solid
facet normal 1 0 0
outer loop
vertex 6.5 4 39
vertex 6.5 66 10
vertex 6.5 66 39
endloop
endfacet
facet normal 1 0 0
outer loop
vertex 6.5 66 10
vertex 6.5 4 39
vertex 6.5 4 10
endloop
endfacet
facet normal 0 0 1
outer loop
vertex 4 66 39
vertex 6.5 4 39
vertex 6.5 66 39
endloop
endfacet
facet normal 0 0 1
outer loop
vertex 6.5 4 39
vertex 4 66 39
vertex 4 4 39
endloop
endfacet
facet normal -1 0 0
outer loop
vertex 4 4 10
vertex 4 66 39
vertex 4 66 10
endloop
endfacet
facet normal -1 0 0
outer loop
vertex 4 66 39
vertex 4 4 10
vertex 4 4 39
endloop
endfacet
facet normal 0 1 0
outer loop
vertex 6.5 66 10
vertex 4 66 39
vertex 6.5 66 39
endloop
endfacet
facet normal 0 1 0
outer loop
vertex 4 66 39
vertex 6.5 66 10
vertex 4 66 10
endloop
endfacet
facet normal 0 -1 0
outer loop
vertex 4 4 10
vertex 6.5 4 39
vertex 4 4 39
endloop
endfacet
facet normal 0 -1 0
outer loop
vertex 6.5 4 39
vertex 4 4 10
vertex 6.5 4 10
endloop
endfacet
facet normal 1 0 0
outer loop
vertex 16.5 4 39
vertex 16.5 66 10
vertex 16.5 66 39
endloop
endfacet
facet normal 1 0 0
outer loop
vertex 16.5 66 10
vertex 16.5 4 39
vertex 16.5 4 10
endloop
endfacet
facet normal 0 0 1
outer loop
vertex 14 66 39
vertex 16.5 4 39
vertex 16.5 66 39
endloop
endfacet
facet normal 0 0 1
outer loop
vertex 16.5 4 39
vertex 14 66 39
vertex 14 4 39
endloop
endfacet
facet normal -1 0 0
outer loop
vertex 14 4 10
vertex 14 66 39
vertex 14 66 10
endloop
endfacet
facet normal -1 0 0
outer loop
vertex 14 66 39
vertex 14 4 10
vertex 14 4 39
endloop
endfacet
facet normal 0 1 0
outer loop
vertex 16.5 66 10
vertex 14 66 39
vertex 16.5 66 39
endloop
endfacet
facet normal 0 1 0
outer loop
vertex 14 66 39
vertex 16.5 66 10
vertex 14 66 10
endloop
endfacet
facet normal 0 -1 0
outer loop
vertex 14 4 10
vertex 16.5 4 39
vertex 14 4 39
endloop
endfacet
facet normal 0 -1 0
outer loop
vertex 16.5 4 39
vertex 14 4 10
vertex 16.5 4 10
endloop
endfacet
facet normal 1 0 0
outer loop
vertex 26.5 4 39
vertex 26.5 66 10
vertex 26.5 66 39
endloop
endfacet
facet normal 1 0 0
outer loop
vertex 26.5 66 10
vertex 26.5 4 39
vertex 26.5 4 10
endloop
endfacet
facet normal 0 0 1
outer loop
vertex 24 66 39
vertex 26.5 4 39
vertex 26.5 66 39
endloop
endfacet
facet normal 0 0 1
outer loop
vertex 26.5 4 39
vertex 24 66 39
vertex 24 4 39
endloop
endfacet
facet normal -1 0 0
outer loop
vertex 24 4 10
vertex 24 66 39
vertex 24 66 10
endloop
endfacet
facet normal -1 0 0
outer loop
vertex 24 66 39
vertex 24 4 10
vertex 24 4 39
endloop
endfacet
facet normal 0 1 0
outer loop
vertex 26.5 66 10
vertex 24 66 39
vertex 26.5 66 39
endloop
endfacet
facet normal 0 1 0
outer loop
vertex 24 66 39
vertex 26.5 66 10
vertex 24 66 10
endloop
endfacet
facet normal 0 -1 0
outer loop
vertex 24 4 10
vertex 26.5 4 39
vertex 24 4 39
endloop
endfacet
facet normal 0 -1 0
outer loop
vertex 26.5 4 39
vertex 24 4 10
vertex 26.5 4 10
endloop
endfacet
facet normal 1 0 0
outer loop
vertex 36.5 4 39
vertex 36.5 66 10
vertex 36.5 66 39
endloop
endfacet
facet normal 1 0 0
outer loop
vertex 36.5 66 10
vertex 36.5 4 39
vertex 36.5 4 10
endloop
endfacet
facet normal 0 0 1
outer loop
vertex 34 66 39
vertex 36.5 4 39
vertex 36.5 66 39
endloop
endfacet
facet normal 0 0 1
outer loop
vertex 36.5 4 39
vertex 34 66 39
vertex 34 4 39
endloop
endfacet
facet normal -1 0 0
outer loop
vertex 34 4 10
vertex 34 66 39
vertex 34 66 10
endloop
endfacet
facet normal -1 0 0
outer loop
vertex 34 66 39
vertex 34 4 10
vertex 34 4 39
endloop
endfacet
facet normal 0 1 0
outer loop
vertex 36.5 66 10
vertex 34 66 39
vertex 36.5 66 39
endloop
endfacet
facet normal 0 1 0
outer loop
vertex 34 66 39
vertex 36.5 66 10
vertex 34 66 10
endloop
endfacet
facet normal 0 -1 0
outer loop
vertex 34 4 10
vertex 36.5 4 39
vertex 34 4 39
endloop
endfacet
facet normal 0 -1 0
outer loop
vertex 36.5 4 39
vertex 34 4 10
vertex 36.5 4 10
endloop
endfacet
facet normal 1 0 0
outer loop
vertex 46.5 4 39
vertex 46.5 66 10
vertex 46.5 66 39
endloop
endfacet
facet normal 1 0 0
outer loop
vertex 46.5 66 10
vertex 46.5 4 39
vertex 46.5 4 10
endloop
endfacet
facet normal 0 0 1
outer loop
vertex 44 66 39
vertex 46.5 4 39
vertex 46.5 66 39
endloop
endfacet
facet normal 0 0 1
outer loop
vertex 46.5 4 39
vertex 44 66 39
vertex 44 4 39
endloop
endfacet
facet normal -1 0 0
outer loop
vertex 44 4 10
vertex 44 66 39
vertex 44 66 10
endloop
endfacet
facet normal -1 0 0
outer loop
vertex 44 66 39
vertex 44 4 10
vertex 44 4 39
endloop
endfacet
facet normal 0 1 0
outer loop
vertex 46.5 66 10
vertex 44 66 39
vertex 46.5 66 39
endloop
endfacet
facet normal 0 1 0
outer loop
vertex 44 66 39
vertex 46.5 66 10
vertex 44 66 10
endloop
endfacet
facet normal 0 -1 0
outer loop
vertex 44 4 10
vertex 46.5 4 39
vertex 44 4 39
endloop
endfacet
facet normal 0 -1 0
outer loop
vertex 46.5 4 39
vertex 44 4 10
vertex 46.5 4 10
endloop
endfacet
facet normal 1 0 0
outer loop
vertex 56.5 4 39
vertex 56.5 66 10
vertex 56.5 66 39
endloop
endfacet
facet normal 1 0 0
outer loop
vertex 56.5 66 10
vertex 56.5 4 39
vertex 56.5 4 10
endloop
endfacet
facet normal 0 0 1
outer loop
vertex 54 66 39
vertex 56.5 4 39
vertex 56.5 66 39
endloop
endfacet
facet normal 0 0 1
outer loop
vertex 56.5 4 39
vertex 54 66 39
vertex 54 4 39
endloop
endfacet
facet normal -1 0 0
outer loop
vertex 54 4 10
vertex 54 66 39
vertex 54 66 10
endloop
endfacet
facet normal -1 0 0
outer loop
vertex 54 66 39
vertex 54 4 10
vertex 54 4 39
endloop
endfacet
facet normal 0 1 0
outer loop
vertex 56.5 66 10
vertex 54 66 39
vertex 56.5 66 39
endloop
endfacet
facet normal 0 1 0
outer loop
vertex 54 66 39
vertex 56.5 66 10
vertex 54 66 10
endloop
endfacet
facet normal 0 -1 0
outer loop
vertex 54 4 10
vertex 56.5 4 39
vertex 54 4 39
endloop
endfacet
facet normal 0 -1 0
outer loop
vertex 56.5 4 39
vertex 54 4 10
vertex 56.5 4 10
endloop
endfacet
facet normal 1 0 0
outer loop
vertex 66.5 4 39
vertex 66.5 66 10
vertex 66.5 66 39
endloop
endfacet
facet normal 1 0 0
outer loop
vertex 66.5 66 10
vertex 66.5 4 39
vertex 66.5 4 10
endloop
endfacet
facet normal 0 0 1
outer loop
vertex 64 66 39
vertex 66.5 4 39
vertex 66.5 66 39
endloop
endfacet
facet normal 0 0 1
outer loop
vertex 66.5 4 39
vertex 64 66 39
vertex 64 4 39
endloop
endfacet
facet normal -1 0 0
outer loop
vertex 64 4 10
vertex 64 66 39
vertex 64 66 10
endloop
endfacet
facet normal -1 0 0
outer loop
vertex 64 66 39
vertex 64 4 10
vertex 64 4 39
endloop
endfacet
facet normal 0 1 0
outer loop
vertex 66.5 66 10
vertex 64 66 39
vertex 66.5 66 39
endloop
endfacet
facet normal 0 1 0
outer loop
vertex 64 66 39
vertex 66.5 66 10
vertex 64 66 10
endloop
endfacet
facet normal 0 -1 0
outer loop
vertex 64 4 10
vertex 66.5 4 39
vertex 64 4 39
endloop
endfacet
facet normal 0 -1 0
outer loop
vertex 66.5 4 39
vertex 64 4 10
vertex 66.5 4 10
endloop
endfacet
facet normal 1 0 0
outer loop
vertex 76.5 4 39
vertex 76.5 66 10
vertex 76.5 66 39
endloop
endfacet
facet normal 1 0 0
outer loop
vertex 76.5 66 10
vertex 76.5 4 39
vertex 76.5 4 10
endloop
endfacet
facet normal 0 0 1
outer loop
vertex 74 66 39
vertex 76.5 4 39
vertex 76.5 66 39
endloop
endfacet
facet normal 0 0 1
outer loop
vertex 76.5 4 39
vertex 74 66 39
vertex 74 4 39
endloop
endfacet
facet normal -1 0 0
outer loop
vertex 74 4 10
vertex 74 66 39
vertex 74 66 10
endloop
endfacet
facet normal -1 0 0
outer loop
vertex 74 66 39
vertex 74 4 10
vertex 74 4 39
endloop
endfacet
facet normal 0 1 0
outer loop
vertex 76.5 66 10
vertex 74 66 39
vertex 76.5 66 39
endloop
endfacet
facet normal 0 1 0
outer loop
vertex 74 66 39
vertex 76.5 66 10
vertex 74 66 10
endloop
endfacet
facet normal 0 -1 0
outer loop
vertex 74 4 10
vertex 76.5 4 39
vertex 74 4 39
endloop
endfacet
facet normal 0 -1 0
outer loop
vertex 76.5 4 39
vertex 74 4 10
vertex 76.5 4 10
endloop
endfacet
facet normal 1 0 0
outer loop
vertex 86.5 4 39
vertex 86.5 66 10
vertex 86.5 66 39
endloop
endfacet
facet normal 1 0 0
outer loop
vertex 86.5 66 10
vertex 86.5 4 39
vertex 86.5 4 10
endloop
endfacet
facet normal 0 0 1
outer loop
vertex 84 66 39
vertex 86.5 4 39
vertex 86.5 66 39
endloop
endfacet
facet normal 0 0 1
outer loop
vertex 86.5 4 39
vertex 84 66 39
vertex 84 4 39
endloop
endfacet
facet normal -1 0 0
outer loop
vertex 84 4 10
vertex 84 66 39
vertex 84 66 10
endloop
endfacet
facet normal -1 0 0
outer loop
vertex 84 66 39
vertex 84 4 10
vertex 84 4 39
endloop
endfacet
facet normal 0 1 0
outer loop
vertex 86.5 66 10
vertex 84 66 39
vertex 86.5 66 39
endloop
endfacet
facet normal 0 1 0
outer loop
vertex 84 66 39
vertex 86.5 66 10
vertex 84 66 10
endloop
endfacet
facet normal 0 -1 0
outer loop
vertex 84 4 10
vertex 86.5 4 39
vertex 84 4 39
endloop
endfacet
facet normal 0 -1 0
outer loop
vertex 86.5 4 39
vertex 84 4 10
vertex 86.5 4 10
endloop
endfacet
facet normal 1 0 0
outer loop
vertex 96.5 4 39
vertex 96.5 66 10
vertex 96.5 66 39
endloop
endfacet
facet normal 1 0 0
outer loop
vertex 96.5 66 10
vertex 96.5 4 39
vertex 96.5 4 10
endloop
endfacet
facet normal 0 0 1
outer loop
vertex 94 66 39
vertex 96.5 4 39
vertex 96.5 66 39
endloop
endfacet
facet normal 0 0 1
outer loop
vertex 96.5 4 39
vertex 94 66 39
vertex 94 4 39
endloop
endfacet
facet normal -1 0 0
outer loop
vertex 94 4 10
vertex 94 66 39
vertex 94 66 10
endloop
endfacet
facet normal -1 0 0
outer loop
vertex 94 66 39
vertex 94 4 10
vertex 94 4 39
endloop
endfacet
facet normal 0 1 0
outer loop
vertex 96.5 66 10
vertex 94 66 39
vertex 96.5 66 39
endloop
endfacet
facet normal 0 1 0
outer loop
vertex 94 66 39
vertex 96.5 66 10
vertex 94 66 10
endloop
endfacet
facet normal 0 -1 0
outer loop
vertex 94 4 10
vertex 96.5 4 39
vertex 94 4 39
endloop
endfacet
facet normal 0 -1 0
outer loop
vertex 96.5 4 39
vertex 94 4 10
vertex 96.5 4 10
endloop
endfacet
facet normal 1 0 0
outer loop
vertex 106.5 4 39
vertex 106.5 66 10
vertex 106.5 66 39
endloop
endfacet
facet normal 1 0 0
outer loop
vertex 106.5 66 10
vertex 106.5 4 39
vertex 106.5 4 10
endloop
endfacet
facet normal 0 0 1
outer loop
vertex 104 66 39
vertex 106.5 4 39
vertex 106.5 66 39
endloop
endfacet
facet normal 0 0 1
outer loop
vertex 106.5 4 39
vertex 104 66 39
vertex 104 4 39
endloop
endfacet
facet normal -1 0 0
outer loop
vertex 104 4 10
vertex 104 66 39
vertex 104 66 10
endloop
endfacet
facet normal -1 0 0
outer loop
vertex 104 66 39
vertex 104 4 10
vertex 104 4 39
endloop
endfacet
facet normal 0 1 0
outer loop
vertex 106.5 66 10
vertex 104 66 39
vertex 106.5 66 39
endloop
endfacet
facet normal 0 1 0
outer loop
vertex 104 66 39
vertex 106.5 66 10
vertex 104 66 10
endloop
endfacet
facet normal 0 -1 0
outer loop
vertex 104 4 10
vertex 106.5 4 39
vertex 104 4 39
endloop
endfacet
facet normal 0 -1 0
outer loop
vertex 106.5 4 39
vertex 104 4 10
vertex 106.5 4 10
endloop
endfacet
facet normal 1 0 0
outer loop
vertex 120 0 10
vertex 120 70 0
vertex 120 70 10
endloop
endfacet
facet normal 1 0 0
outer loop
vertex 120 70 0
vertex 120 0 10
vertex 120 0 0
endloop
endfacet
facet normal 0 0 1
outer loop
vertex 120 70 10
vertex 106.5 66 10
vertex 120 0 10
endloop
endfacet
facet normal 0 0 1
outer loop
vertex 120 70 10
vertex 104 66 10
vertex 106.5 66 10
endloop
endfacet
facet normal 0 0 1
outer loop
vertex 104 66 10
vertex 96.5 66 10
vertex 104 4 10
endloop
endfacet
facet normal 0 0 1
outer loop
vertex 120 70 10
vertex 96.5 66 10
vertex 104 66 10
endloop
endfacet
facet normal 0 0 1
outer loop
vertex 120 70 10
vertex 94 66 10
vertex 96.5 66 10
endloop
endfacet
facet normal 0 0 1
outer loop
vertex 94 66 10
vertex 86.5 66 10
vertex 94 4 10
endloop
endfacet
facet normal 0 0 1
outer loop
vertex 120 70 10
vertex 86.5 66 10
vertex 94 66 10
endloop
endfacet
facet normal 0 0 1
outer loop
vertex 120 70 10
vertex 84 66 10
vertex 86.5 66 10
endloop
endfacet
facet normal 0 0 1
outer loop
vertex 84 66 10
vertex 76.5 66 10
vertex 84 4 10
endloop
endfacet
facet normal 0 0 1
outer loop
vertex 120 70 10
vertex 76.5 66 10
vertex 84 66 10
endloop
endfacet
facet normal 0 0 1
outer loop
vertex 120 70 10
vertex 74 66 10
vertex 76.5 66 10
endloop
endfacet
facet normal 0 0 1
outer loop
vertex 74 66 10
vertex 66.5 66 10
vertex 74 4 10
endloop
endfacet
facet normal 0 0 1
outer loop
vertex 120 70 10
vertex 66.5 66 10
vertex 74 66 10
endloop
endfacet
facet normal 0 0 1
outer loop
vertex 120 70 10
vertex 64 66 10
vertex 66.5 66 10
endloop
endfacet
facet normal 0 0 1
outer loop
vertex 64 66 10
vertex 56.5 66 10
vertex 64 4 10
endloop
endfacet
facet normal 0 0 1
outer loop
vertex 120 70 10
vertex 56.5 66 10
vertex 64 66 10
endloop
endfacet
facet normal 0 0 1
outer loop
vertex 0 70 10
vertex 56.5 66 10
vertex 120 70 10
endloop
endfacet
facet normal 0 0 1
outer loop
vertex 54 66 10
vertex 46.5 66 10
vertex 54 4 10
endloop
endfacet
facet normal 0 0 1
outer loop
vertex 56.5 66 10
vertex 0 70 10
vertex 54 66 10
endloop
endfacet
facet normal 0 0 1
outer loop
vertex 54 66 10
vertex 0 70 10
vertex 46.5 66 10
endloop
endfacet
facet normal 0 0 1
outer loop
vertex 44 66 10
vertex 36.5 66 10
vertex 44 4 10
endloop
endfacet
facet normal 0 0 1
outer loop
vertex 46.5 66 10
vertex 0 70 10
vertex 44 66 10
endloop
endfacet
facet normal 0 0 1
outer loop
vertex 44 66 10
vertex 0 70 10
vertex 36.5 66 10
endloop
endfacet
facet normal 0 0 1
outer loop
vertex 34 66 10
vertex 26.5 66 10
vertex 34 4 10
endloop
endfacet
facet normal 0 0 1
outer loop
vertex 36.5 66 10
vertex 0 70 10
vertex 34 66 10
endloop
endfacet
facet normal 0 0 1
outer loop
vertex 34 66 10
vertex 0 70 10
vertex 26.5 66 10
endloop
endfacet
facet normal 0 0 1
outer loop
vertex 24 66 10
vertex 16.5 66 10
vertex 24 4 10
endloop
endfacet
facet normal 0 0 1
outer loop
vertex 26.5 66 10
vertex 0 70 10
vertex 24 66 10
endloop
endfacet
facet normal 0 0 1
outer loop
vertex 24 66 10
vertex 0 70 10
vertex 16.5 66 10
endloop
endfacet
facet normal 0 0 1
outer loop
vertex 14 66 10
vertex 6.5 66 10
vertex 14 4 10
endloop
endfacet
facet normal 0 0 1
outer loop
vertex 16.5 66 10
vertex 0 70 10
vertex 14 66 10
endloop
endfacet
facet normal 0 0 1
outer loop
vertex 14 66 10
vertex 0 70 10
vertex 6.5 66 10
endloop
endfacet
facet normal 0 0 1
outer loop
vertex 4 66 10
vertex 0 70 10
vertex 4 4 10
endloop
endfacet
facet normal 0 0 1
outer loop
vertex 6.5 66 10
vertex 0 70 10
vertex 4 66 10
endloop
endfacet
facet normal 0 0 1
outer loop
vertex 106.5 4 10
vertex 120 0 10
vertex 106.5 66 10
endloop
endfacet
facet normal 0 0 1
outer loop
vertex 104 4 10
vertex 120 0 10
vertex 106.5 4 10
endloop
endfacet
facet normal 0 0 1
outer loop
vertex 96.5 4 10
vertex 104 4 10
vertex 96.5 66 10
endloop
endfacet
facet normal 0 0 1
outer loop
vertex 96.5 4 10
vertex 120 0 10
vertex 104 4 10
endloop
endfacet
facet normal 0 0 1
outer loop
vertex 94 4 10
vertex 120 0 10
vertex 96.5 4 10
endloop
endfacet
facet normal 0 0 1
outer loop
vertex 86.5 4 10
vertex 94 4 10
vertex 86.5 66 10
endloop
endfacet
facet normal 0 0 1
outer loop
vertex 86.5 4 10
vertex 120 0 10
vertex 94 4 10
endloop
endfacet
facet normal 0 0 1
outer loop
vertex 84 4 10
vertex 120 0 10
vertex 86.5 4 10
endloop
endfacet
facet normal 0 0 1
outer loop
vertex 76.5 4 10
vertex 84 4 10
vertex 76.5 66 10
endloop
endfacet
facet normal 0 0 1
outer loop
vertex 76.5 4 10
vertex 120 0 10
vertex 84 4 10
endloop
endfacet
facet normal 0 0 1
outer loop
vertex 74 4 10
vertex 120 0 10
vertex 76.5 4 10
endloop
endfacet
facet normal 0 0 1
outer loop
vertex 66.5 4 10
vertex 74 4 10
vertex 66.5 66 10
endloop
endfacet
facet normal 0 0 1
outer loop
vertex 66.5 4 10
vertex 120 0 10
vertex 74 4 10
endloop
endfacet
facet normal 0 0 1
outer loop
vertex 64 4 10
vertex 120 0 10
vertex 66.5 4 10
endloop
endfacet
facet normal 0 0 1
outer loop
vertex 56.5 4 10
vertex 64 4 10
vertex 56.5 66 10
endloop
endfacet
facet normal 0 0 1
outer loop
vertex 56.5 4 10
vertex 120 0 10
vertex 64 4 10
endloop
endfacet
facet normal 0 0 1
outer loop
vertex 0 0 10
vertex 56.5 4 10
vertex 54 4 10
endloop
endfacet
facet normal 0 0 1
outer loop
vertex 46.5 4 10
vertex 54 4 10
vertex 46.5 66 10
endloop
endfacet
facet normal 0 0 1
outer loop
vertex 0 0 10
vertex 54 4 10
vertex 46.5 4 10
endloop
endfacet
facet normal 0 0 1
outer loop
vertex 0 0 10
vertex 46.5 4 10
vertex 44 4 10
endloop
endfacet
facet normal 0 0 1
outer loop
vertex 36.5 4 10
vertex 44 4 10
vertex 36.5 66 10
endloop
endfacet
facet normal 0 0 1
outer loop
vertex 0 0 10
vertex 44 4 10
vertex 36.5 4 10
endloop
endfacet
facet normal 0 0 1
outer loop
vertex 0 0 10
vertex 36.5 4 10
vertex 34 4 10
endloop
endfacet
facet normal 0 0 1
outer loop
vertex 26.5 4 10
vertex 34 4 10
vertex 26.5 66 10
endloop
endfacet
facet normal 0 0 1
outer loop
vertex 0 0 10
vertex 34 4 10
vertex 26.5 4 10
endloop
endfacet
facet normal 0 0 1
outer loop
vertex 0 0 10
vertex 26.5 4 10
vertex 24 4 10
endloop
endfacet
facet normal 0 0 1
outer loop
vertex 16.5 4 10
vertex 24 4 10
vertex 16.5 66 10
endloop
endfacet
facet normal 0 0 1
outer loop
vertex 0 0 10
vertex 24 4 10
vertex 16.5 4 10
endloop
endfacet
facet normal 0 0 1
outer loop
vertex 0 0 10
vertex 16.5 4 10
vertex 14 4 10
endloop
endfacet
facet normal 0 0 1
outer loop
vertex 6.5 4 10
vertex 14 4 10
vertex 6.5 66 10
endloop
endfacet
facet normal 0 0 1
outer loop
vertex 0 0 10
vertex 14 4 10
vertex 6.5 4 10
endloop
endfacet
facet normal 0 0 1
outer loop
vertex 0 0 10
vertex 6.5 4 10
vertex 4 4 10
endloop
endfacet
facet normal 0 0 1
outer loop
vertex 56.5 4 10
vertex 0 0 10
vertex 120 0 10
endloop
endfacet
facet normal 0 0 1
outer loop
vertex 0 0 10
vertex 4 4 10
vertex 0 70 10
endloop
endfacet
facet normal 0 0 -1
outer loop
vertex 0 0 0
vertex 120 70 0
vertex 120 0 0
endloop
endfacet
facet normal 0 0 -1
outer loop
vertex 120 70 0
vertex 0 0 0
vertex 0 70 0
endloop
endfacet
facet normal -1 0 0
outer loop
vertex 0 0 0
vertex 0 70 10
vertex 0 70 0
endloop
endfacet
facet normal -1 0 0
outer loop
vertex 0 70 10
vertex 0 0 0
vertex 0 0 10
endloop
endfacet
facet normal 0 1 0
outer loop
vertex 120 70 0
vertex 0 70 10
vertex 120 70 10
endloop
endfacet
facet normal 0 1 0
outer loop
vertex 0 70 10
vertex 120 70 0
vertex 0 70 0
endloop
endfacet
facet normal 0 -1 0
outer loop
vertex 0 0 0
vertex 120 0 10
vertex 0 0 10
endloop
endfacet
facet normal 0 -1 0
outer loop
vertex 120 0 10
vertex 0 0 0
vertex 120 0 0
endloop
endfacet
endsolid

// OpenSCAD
$fn = 32;

// ----------------------------------------------------------------------
// Heatsink: uniform fin block
// ----------------------------------------------------------------------

// --- parameters (mm) ---
base_l = 120;             // base length, X
base_w = 70;              // base width, Y
base_t = 10;              // base plate thickness
fin_h = 30;               // fin height above the base
fin_t = 2.5;              // fin thickness
edge = 4;                 // margin from the base ends
pitch = 10;               // fin pitch

n_fins = floor((base_l - 2 * edge - fin_t) / pitch) + 1;  // fin count
total_h = base_t + fin_h - 1;  // overall height

union() {
  cube([base_l, base_w, base_t]);
  for (i = [0 : n_fins - 1])
    translate([edge + i * pitch, edge, base_t - 1])
      cube([fin_t, base_w - 2 * edge, fin_h]);
}
